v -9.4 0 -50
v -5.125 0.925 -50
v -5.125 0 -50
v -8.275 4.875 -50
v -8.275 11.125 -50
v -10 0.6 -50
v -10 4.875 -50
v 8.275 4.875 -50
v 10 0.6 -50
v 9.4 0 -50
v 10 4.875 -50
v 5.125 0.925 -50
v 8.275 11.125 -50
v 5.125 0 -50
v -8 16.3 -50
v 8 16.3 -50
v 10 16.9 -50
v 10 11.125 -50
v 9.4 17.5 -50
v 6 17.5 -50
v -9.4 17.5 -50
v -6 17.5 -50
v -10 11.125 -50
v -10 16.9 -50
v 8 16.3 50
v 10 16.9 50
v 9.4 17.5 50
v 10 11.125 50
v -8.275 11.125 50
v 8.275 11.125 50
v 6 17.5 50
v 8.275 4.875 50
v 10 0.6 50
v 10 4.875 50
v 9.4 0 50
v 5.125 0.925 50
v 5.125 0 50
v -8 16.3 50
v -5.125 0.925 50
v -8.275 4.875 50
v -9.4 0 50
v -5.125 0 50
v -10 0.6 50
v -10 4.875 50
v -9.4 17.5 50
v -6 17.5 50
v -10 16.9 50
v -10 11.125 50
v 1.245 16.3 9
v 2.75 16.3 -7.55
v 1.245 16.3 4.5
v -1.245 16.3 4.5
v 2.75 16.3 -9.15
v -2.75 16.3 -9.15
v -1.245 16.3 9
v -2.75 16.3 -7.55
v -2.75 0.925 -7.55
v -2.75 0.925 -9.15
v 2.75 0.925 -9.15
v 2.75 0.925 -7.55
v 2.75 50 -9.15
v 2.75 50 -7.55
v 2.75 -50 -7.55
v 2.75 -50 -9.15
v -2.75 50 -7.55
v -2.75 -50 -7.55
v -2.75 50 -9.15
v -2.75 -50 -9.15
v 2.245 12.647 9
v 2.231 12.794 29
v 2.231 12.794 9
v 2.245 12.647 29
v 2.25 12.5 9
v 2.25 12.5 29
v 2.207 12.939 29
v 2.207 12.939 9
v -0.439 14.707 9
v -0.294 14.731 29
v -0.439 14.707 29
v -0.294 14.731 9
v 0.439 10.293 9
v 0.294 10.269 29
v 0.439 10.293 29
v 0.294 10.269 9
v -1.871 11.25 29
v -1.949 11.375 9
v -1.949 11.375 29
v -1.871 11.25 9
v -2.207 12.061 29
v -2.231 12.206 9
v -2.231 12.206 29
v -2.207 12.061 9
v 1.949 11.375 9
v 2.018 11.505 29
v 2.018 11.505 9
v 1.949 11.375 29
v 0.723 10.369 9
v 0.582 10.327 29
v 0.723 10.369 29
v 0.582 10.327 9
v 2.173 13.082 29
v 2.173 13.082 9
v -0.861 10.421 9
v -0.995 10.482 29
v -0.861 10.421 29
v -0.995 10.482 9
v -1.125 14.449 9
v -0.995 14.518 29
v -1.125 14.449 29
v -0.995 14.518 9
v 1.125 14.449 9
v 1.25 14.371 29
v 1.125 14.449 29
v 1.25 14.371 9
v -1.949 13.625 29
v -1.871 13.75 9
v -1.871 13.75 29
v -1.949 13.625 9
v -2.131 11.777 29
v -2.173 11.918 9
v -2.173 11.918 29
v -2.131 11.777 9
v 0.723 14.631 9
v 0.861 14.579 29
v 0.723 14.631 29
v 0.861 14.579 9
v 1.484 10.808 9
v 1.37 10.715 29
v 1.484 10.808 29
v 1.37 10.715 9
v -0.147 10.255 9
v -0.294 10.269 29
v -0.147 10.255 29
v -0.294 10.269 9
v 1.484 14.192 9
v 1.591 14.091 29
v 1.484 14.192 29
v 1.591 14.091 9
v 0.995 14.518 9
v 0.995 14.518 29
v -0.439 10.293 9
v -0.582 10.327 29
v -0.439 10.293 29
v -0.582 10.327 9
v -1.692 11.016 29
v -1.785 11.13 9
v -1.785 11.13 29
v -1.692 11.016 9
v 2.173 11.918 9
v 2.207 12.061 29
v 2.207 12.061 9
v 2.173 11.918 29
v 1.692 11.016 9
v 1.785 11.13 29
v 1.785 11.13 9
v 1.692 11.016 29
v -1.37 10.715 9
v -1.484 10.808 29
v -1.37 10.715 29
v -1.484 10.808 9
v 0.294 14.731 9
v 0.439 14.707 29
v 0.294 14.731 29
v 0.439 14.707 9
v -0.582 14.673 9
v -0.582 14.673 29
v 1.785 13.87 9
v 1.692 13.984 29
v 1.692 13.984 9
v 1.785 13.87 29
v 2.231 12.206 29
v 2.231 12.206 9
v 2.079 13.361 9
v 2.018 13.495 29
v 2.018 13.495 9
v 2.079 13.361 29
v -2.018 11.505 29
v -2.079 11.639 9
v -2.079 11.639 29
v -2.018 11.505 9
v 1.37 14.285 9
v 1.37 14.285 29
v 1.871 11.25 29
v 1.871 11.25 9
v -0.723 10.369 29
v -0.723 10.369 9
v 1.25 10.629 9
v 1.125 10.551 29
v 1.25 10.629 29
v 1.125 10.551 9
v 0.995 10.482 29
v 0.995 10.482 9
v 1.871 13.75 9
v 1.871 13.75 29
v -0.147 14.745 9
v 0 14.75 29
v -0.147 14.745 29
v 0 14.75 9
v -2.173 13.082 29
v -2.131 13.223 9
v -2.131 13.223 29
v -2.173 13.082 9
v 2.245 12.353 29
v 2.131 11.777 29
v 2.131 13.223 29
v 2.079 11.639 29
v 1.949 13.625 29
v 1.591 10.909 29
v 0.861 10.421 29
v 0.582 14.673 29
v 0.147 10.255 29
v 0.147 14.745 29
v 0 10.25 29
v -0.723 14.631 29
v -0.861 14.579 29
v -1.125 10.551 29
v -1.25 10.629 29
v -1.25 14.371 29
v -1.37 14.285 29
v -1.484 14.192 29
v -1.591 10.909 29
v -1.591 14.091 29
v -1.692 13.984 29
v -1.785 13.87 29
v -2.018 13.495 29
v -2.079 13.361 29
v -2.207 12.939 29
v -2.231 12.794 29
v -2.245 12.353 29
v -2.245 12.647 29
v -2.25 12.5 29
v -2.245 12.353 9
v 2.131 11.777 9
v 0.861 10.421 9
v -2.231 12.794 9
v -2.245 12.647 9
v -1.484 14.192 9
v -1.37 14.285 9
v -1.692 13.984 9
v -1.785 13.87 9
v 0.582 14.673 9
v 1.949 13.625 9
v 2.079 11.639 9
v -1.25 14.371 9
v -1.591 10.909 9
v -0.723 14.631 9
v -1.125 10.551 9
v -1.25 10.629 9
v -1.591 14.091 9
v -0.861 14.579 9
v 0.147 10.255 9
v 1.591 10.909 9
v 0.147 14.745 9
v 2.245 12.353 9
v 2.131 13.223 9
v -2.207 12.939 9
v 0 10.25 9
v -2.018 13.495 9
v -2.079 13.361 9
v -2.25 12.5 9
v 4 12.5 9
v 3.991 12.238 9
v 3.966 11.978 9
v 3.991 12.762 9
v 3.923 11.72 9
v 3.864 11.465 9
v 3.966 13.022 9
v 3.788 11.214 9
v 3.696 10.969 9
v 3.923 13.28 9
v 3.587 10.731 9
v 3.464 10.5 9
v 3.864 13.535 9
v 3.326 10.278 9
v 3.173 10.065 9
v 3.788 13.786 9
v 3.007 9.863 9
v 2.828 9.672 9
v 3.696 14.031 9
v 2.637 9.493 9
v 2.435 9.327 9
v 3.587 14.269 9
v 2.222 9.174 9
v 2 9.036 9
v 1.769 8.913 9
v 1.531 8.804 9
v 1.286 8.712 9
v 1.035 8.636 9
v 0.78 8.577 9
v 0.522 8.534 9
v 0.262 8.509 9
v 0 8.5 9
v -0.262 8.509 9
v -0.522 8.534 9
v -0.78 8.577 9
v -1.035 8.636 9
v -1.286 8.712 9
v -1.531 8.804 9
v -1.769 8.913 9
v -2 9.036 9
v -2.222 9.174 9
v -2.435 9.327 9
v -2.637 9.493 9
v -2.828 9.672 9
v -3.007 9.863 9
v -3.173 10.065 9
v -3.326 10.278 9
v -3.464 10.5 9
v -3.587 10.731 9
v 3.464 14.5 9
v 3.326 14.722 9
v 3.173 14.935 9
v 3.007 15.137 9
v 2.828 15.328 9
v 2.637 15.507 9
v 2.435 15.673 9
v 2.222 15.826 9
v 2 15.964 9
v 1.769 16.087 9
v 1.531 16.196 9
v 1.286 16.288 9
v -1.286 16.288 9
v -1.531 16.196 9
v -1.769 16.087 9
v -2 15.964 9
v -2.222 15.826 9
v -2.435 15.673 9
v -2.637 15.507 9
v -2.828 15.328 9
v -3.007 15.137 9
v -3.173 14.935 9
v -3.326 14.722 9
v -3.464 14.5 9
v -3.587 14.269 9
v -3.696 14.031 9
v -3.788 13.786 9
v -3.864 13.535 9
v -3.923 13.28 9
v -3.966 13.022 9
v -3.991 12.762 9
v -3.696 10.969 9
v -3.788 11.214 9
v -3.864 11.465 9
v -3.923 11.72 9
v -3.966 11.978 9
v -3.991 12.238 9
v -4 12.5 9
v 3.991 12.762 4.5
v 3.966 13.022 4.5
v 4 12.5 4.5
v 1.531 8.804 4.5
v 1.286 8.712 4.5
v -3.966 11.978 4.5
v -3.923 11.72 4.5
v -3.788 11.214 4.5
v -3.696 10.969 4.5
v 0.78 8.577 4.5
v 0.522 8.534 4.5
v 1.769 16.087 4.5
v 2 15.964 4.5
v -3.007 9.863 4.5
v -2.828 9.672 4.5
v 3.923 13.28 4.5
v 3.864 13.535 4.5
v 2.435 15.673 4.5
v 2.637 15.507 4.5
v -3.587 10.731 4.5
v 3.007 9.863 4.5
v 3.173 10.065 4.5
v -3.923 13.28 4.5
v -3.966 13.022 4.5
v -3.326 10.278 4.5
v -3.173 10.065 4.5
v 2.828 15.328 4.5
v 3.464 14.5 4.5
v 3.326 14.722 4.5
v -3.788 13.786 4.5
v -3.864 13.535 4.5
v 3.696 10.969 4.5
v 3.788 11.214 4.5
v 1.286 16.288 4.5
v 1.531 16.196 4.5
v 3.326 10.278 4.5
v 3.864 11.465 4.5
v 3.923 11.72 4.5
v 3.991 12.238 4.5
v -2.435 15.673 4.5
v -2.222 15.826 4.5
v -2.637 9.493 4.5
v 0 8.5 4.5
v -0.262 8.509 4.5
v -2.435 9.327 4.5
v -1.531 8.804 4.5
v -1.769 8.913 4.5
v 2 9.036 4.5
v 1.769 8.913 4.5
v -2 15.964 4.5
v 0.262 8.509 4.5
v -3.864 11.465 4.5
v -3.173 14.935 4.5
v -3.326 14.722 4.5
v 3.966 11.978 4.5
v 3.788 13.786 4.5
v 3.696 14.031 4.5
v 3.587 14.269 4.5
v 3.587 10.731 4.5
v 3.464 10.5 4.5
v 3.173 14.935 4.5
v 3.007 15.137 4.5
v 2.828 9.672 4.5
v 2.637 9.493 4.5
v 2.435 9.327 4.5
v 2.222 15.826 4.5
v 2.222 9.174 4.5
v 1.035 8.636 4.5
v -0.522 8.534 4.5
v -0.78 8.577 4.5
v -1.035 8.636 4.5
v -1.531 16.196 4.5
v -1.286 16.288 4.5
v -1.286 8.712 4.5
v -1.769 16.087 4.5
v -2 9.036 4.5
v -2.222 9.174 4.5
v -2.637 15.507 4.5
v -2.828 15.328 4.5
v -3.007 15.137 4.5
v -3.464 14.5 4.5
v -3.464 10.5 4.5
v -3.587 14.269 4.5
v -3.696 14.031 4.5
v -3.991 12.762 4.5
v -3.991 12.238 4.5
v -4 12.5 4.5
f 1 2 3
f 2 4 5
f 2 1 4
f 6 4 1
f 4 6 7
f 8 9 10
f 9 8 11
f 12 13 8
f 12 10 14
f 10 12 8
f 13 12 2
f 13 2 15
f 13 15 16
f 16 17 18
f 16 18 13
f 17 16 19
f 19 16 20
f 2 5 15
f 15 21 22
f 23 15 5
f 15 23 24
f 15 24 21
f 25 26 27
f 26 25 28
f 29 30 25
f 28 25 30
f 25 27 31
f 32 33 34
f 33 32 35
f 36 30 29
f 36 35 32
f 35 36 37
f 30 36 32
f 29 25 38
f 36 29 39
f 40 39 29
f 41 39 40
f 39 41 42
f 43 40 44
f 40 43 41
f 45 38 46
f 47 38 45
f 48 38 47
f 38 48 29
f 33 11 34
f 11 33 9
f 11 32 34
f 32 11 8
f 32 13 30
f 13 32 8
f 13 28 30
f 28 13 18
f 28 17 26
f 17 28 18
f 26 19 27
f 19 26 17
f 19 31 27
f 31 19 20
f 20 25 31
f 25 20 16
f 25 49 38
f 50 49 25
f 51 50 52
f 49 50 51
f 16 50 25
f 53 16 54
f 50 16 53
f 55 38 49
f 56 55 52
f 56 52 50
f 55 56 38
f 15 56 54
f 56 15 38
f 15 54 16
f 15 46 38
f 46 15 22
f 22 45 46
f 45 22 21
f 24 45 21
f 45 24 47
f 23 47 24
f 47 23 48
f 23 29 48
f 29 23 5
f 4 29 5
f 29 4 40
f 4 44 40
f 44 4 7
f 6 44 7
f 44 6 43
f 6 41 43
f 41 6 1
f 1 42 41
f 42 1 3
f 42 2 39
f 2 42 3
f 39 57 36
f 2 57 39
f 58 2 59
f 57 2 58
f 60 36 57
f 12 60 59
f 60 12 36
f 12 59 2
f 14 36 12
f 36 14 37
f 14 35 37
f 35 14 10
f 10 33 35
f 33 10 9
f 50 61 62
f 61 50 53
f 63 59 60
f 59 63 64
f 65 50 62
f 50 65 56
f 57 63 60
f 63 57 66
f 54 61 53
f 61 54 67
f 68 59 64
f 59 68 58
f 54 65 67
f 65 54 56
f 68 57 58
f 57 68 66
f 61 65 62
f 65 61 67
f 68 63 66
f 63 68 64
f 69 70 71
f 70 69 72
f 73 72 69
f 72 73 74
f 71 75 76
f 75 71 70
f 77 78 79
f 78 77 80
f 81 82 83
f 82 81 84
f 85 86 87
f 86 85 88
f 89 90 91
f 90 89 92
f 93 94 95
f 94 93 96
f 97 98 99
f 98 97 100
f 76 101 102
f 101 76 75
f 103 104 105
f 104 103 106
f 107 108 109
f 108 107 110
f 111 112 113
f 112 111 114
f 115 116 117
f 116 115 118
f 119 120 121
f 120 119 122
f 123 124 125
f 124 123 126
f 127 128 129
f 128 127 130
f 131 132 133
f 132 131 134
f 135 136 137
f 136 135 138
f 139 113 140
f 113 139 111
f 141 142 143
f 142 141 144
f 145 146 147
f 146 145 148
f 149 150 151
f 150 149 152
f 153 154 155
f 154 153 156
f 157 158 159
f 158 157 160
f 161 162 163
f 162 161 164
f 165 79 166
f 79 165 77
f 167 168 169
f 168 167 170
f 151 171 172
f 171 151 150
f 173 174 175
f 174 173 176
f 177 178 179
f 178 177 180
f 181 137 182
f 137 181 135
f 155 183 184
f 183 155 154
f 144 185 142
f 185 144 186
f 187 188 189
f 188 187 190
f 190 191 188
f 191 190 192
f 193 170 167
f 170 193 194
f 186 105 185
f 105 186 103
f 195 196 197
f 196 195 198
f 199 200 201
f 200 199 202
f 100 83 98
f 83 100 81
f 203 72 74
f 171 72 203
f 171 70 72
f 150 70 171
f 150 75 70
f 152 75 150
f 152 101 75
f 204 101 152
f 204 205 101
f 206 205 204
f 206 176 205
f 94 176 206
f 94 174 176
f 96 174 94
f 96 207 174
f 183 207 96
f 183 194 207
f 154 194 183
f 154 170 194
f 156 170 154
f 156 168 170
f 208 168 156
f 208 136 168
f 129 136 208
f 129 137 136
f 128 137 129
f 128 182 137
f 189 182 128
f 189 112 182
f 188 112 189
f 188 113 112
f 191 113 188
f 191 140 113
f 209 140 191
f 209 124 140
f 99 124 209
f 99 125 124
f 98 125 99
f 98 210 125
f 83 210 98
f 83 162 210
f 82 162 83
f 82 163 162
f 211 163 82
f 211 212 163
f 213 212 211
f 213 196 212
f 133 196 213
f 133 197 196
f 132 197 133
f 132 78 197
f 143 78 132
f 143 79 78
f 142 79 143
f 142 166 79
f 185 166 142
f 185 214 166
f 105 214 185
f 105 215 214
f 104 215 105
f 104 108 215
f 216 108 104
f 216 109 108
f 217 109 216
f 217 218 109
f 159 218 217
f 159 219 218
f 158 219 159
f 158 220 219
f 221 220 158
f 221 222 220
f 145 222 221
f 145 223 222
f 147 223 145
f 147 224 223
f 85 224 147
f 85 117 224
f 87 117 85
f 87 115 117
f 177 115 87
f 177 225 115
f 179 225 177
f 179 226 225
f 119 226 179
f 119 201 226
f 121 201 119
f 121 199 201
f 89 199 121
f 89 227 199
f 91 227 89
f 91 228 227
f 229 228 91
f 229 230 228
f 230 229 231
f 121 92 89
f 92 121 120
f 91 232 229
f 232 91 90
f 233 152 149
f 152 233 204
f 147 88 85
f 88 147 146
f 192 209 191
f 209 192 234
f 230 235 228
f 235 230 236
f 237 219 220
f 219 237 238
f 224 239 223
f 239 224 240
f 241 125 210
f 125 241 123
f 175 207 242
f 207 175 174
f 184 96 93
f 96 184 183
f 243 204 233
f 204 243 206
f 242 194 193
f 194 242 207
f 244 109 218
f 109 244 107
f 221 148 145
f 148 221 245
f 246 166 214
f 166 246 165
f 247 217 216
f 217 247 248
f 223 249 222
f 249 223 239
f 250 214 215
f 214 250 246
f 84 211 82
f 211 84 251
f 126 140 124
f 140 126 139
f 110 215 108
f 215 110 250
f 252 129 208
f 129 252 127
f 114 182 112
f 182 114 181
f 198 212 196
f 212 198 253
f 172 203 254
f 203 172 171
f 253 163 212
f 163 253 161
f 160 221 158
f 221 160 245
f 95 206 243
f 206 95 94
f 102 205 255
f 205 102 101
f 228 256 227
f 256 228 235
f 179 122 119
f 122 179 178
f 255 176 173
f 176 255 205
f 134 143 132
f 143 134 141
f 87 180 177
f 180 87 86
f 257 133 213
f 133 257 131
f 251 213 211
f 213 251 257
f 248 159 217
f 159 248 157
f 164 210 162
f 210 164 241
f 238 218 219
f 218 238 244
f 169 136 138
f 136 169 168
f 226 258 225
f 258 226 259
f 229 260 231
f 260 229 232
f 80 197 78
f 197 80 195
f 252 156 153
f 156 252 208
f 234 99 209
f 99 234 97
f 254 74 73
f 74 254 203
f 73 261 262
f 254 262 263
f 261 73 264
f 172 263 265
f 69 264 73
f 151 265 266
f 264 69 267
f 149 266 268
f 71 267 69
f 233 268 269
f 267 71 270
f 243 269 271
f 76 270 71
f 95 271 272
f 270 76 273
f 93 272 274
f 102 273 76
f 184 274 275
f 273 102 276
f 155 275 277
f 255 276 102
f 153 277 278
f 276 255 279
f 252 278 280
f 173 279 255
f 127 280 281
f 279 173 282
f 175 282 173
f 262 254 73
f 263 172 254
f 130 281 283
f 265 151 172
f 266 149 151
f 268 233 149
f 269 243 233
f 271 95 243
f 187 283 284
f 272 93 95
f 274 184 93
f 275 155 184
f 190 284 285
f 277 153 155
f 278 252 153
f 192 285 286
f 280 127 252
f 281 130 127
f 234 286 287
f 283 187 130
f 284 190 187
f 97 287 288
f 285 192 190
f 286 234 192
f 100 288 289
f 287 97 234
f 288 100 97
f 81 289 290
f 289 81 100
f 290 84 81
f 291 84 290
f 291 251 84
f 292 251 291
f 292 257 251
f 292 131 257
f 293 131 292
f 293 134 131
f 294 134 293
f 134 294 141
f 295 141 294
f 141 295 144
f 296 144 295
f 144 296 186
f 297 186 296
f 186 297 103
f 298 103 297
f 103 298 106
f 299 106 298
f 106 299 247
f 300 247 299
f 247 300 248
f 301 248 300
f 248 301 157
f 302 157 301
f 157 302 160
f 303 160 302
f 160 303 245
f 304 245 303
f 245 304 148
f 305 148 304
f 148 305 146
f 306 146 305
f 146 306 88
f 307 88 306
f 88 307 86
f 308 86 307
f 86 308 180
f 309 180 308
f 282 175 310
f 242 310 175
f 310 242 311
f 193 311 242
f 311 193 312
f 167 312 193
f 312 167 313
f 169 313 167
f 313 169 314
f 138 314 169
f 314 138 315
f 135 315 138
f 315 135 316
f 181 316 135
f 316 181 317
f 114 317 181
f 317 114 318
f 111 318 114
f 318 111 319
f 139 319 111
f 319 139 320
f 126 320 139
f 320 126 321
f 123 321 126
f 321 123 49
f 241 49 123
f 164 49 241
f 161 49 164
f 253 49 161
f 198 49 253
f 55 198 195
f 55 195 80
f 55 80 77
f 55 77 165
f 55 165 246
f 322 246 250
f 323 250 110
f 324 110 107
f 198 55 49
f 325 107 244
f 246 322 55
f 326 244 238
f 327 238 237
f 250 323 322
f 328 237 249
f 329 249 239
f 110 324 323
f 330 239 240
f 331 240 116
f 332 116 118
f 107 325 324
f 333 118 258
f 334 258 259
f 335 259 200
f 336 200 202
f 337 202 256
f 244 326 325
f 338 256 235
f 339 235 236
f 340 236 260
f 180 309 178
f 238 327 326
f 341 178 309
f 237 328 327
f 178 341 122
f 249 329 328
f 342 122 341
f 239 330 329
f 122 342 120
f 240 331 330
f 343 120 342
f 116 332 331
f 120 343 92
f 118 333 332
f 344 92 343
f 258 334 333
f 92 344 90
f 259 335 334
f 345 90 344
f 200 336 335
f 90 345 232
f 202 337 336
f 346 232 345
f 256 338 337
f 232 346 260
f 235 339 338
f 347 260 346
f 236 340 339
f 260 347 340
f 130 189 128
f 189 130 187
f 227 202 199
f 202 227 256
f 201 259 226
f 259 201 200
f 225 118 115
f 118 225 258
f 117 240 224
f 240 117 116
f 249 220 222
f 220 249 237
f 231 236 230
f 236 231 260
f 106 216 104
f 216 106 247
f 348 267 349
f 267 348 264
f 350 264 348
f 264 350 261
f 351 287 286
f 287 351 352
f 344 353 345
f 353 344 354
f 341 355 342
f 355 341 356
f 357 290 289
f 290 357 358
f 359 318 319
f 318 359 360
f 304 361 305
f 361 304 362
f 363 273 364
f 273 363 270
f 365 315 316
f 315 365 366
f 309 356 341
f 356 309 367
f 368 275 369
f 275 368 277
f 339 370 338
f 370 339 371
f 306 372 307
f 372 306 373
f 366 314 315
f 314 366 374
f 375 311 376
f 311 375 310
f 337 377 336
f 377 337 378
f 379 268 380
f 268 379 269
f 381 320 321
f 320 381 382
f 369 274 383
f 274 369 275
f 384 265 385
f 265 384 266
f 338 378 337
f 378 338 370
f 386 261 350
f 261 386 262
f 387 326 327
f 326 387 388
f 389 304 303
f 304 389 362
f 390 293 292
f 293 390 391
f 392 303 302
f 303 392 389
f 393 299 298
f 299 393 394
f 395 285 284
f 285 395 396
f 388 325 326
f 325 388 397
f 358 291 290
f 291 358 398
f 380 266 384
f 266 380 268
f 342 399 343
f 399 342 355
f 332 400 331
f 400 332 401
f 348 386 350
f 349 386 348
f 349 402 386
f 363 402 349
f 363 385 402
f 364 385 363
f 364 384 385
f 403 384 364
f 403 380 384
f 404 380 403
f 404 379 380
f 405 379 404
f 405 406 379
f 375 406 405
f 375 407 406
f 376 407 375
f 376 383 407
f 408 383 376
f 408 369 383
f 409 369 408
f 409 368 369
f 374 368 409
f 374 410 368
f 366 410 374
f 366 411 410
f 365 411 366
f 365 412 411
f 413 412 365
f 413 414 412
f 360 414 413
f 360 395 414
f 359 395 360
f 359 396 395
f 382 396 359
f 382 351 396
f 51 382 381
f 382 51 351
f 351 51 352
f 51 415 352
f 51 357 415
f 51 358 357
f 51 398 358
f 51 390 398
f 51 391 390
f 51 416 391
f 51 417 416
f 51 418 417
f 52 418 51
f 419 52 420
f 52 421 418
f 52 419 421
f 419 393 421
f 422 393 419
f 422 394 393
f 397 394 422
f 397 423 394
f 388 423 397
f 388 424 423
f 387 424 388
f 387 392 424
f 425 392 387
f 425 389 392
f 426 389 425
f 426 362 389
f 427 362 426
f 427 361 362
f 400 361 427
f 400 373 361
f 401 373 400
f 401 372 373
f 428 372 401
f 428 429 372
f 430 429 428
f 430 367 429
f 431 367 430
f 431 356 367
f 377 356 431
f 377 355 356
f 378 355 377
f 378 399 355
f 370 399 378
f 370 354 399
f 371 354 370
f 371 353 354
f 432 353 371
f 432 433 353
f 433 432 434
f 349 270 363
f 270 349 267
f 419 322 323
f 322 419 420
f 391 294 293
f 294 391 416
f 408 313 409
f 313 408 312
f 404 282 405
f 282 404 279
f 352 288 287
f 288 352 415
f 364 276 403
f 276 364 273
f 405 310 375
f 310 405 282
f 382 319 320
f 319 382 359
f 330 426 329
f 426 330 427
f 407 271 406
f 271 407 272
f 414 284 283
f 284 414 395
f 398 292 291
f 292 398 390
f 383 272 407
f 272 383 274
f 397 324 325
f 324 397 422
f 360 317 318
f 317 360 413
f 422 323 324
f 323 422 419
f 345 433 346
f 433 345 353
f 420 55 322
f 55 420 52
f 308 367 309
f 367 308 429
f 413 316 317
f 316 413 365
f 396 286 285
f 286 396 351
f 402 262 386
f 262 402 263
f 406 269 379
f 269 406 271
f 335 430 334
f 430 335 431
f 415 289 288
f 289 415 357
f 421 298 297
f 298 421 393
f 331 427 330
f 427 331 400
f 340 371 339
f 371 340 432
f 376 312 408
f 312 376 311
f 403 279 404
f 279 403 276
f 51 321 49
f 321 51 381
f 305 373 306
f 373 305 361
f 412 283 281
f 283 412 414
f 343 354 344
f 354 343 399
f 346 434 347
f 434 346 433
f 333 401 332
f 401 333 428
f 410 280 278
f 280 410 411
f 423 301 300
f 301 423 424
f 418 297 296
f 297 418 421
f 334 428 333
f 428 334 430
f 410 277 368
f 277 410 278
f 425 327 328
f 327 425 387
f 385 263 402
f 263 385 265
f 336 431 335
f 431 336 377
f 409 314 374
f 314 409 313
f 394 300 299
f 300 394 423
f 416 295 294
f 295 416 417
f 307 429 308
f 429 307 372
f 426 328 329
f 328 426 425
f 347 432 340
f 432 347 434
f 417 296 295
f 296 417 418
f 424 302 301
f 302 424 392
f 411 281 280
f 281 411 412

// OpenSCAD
$fn = 96;

// Target overall dimensions
width_mm  = 20.0;   // X
height_mm = 17.5;   // Z
length_mm = 100.0;  // Y

// Mounting holes (typical linear rail)
mount_hole_diameter_mm = 4.5;          // through
mount_hole_counterbore_diameter_mm = 8.0;
mount_hole_counterbore_depth_mm = 4.0;
mount_hole_pitch_mm = 25.0;
mount_hole_end_offset_mm = 12.5;
mount_hole_count = 4;

// Profile details (approximate rail features)
top_flat_w_mm = 12.0;
top_step_drop_mm = 1.2;
side_undercut_depth_mm = 1.6;
side_undercut_height_mm = 6.0;
side_undercut_z_center_mm = 8.0;

bottom_relief_depth_mm = 0.8;
bottom_relief_w_mm = 10.0;

edge_chamfer_mm = 0.6;
overlap_mm = 0.25;
hole_extra_depth_mm = 2.0;

// Structural connectivity overlap (1–2mm as required)
attach_overlap_mm = 1.2;

// Helpers
function clamp(v, lo, hi) = v < lo ? lo : (v > hi ? hi : v);

module rail_profile_2d() {
    // 2D cross-section in X-Z plane, extruded along Y
    w = width_mm;
    h = height_mm;

    ch = clamp(edge_chamfer_mm, 0, min(w,h)/4);

    top_flat_w = clamp(top_flat_w_mm, 0.1, w - 2*ch);
    top_step_drop = clamp(top_step_drop_mm, 0, h - 0.1);

    // Shoulder width at the step level
    shoulder_w = clamp(top_flat_w + 2*2.0, top_flat_w, w - 2*ch);

    // Side undercut parameters
    uc_d = clamp(side_undercut_depth_mm, 0, w/2 - 0.5);
    uc_h = clamp(side_undercut_height_mm, 0.1, h - 0.5);
    uc_zc = clamp(side_undercut_z_center_mm, uc_h/2 + 0.2, h - uc_h/2 - 0.2);

    // Bottom relief
    br_d = clamp(bottom_relief_depth_mm, 0, h/2);
    br_w = clamp(bottom_relief_w_mm, 0.1, w - 2*ch);

    // Outer polygon (simple chamfers + top step)
    outer = [
        [-w/2 + ch, 0],
        [ w/2 - ch, 0],
        [ w/2, ch],
        [ w/2, h - ch],
        [ w/2 - ch, h],

        // top step geometry
        [ w/2 - (w - top_flat_w)/2, h],                 // right edge of top flat
        [ w/2 - (w - shoulder_w)/2, h - top_step_drop],  // right shoulder at step
        [-w/2 + (w - shoulder_w)/2, h - top_step_drop],  // left shoulder at step
        [-w/2 + (w - top_flat_w)/2, h],                  // left edge of top flat

        [-w/2 + ch, h],
        [-w/2, h - ch],
        [-w/2, ch]
    ];

    difference() {
        polygon(points=outer);

        // Side undercuts (raceway-like grooves), symmetric
        for (sx = [-1, 1]) {
            translate([sx*(w/2 - uc_d/2), uc_zc])
                square([uc_d + overlap_mm, uc_h + overlap_mm], center=true);
        }

        // Bottom relief slot
        translate([0, br_d/2])
            square([br_w + overlap_mm, br_d + overlap_mm], center=true);
    }
}

module rail_body_core() {
    // Extrude along Y (length). Keep centered for easy hole placement.
    linear_extrude(height=length_mm, center=true, convexity=10)
        rail_profile_2d();
}

// Bottom rectangular feature: MUST be attached (overlap 1–2mm into rail body).
module bottom_rect_feature() {
    feat_w = clamp(bottom_relief_w_mm * 0.55, 4.0, width_mm - 2.0); // X
    feat_h = 1.6;                                                   // Z thickness
    feat_l = length_mm;                                             // Y

    // Rail body (core) spans Z: [-height_mm/2 .. +height_mm/2] because extrusion is centered.
    // Attach feature below the rail, with its top penetrating into the rail by attach_overlap_mm.
    // Feature Z extents: [z0 .. z0+feat_h], where z0 = -height_mm/2 - feat_h + attach_overlap_mm
    z0 = -height_mm/2 - feat_h + attach_overlap_mm;
    translate([0, 0, z0 + feat_h/2])
        cube([feat_w, feat_l, feat_h], center=true);
}

module rail_body() {
    // Union all solids so there are no floating/disconnected parts.
    union() {
        rail_body_core();
        bottom_rect_feature();
    }
}

module mounting_holes() {
    // Holes oriented along Z (down from top face).
    for (i = [0:mount_hole_count-1]) {
        y = -length_mm/2 + mount_hole_end_offset_mm + i*mount_hole_pitch_mm;

        // Through hole: start slightly above top, cut down past bottom
        translate([0, y, height_mm/2 + overlap_mm])
            cylinder(h=height_mm + hole_extra_depth_mm + 2*overlap_mm,
                     r=mount_hole_diameter_mm/2,
                     center=false);

        // Counterbore: starts at top surface and goes down
        translate([0, y, height_mm/2 - mount_hole_counterbore_depth_mm - overlap_mm])
            cylinder(h=mount_hole_counterbore_depth_mm + 2*overlap_mm,
                     r=mount_hole_counterbore_diameter_mm/2,
                     center=false);
    }
}

module rail() {
    difference() {
        rail_body();
        mounting_holes();
    }
}

rail();
